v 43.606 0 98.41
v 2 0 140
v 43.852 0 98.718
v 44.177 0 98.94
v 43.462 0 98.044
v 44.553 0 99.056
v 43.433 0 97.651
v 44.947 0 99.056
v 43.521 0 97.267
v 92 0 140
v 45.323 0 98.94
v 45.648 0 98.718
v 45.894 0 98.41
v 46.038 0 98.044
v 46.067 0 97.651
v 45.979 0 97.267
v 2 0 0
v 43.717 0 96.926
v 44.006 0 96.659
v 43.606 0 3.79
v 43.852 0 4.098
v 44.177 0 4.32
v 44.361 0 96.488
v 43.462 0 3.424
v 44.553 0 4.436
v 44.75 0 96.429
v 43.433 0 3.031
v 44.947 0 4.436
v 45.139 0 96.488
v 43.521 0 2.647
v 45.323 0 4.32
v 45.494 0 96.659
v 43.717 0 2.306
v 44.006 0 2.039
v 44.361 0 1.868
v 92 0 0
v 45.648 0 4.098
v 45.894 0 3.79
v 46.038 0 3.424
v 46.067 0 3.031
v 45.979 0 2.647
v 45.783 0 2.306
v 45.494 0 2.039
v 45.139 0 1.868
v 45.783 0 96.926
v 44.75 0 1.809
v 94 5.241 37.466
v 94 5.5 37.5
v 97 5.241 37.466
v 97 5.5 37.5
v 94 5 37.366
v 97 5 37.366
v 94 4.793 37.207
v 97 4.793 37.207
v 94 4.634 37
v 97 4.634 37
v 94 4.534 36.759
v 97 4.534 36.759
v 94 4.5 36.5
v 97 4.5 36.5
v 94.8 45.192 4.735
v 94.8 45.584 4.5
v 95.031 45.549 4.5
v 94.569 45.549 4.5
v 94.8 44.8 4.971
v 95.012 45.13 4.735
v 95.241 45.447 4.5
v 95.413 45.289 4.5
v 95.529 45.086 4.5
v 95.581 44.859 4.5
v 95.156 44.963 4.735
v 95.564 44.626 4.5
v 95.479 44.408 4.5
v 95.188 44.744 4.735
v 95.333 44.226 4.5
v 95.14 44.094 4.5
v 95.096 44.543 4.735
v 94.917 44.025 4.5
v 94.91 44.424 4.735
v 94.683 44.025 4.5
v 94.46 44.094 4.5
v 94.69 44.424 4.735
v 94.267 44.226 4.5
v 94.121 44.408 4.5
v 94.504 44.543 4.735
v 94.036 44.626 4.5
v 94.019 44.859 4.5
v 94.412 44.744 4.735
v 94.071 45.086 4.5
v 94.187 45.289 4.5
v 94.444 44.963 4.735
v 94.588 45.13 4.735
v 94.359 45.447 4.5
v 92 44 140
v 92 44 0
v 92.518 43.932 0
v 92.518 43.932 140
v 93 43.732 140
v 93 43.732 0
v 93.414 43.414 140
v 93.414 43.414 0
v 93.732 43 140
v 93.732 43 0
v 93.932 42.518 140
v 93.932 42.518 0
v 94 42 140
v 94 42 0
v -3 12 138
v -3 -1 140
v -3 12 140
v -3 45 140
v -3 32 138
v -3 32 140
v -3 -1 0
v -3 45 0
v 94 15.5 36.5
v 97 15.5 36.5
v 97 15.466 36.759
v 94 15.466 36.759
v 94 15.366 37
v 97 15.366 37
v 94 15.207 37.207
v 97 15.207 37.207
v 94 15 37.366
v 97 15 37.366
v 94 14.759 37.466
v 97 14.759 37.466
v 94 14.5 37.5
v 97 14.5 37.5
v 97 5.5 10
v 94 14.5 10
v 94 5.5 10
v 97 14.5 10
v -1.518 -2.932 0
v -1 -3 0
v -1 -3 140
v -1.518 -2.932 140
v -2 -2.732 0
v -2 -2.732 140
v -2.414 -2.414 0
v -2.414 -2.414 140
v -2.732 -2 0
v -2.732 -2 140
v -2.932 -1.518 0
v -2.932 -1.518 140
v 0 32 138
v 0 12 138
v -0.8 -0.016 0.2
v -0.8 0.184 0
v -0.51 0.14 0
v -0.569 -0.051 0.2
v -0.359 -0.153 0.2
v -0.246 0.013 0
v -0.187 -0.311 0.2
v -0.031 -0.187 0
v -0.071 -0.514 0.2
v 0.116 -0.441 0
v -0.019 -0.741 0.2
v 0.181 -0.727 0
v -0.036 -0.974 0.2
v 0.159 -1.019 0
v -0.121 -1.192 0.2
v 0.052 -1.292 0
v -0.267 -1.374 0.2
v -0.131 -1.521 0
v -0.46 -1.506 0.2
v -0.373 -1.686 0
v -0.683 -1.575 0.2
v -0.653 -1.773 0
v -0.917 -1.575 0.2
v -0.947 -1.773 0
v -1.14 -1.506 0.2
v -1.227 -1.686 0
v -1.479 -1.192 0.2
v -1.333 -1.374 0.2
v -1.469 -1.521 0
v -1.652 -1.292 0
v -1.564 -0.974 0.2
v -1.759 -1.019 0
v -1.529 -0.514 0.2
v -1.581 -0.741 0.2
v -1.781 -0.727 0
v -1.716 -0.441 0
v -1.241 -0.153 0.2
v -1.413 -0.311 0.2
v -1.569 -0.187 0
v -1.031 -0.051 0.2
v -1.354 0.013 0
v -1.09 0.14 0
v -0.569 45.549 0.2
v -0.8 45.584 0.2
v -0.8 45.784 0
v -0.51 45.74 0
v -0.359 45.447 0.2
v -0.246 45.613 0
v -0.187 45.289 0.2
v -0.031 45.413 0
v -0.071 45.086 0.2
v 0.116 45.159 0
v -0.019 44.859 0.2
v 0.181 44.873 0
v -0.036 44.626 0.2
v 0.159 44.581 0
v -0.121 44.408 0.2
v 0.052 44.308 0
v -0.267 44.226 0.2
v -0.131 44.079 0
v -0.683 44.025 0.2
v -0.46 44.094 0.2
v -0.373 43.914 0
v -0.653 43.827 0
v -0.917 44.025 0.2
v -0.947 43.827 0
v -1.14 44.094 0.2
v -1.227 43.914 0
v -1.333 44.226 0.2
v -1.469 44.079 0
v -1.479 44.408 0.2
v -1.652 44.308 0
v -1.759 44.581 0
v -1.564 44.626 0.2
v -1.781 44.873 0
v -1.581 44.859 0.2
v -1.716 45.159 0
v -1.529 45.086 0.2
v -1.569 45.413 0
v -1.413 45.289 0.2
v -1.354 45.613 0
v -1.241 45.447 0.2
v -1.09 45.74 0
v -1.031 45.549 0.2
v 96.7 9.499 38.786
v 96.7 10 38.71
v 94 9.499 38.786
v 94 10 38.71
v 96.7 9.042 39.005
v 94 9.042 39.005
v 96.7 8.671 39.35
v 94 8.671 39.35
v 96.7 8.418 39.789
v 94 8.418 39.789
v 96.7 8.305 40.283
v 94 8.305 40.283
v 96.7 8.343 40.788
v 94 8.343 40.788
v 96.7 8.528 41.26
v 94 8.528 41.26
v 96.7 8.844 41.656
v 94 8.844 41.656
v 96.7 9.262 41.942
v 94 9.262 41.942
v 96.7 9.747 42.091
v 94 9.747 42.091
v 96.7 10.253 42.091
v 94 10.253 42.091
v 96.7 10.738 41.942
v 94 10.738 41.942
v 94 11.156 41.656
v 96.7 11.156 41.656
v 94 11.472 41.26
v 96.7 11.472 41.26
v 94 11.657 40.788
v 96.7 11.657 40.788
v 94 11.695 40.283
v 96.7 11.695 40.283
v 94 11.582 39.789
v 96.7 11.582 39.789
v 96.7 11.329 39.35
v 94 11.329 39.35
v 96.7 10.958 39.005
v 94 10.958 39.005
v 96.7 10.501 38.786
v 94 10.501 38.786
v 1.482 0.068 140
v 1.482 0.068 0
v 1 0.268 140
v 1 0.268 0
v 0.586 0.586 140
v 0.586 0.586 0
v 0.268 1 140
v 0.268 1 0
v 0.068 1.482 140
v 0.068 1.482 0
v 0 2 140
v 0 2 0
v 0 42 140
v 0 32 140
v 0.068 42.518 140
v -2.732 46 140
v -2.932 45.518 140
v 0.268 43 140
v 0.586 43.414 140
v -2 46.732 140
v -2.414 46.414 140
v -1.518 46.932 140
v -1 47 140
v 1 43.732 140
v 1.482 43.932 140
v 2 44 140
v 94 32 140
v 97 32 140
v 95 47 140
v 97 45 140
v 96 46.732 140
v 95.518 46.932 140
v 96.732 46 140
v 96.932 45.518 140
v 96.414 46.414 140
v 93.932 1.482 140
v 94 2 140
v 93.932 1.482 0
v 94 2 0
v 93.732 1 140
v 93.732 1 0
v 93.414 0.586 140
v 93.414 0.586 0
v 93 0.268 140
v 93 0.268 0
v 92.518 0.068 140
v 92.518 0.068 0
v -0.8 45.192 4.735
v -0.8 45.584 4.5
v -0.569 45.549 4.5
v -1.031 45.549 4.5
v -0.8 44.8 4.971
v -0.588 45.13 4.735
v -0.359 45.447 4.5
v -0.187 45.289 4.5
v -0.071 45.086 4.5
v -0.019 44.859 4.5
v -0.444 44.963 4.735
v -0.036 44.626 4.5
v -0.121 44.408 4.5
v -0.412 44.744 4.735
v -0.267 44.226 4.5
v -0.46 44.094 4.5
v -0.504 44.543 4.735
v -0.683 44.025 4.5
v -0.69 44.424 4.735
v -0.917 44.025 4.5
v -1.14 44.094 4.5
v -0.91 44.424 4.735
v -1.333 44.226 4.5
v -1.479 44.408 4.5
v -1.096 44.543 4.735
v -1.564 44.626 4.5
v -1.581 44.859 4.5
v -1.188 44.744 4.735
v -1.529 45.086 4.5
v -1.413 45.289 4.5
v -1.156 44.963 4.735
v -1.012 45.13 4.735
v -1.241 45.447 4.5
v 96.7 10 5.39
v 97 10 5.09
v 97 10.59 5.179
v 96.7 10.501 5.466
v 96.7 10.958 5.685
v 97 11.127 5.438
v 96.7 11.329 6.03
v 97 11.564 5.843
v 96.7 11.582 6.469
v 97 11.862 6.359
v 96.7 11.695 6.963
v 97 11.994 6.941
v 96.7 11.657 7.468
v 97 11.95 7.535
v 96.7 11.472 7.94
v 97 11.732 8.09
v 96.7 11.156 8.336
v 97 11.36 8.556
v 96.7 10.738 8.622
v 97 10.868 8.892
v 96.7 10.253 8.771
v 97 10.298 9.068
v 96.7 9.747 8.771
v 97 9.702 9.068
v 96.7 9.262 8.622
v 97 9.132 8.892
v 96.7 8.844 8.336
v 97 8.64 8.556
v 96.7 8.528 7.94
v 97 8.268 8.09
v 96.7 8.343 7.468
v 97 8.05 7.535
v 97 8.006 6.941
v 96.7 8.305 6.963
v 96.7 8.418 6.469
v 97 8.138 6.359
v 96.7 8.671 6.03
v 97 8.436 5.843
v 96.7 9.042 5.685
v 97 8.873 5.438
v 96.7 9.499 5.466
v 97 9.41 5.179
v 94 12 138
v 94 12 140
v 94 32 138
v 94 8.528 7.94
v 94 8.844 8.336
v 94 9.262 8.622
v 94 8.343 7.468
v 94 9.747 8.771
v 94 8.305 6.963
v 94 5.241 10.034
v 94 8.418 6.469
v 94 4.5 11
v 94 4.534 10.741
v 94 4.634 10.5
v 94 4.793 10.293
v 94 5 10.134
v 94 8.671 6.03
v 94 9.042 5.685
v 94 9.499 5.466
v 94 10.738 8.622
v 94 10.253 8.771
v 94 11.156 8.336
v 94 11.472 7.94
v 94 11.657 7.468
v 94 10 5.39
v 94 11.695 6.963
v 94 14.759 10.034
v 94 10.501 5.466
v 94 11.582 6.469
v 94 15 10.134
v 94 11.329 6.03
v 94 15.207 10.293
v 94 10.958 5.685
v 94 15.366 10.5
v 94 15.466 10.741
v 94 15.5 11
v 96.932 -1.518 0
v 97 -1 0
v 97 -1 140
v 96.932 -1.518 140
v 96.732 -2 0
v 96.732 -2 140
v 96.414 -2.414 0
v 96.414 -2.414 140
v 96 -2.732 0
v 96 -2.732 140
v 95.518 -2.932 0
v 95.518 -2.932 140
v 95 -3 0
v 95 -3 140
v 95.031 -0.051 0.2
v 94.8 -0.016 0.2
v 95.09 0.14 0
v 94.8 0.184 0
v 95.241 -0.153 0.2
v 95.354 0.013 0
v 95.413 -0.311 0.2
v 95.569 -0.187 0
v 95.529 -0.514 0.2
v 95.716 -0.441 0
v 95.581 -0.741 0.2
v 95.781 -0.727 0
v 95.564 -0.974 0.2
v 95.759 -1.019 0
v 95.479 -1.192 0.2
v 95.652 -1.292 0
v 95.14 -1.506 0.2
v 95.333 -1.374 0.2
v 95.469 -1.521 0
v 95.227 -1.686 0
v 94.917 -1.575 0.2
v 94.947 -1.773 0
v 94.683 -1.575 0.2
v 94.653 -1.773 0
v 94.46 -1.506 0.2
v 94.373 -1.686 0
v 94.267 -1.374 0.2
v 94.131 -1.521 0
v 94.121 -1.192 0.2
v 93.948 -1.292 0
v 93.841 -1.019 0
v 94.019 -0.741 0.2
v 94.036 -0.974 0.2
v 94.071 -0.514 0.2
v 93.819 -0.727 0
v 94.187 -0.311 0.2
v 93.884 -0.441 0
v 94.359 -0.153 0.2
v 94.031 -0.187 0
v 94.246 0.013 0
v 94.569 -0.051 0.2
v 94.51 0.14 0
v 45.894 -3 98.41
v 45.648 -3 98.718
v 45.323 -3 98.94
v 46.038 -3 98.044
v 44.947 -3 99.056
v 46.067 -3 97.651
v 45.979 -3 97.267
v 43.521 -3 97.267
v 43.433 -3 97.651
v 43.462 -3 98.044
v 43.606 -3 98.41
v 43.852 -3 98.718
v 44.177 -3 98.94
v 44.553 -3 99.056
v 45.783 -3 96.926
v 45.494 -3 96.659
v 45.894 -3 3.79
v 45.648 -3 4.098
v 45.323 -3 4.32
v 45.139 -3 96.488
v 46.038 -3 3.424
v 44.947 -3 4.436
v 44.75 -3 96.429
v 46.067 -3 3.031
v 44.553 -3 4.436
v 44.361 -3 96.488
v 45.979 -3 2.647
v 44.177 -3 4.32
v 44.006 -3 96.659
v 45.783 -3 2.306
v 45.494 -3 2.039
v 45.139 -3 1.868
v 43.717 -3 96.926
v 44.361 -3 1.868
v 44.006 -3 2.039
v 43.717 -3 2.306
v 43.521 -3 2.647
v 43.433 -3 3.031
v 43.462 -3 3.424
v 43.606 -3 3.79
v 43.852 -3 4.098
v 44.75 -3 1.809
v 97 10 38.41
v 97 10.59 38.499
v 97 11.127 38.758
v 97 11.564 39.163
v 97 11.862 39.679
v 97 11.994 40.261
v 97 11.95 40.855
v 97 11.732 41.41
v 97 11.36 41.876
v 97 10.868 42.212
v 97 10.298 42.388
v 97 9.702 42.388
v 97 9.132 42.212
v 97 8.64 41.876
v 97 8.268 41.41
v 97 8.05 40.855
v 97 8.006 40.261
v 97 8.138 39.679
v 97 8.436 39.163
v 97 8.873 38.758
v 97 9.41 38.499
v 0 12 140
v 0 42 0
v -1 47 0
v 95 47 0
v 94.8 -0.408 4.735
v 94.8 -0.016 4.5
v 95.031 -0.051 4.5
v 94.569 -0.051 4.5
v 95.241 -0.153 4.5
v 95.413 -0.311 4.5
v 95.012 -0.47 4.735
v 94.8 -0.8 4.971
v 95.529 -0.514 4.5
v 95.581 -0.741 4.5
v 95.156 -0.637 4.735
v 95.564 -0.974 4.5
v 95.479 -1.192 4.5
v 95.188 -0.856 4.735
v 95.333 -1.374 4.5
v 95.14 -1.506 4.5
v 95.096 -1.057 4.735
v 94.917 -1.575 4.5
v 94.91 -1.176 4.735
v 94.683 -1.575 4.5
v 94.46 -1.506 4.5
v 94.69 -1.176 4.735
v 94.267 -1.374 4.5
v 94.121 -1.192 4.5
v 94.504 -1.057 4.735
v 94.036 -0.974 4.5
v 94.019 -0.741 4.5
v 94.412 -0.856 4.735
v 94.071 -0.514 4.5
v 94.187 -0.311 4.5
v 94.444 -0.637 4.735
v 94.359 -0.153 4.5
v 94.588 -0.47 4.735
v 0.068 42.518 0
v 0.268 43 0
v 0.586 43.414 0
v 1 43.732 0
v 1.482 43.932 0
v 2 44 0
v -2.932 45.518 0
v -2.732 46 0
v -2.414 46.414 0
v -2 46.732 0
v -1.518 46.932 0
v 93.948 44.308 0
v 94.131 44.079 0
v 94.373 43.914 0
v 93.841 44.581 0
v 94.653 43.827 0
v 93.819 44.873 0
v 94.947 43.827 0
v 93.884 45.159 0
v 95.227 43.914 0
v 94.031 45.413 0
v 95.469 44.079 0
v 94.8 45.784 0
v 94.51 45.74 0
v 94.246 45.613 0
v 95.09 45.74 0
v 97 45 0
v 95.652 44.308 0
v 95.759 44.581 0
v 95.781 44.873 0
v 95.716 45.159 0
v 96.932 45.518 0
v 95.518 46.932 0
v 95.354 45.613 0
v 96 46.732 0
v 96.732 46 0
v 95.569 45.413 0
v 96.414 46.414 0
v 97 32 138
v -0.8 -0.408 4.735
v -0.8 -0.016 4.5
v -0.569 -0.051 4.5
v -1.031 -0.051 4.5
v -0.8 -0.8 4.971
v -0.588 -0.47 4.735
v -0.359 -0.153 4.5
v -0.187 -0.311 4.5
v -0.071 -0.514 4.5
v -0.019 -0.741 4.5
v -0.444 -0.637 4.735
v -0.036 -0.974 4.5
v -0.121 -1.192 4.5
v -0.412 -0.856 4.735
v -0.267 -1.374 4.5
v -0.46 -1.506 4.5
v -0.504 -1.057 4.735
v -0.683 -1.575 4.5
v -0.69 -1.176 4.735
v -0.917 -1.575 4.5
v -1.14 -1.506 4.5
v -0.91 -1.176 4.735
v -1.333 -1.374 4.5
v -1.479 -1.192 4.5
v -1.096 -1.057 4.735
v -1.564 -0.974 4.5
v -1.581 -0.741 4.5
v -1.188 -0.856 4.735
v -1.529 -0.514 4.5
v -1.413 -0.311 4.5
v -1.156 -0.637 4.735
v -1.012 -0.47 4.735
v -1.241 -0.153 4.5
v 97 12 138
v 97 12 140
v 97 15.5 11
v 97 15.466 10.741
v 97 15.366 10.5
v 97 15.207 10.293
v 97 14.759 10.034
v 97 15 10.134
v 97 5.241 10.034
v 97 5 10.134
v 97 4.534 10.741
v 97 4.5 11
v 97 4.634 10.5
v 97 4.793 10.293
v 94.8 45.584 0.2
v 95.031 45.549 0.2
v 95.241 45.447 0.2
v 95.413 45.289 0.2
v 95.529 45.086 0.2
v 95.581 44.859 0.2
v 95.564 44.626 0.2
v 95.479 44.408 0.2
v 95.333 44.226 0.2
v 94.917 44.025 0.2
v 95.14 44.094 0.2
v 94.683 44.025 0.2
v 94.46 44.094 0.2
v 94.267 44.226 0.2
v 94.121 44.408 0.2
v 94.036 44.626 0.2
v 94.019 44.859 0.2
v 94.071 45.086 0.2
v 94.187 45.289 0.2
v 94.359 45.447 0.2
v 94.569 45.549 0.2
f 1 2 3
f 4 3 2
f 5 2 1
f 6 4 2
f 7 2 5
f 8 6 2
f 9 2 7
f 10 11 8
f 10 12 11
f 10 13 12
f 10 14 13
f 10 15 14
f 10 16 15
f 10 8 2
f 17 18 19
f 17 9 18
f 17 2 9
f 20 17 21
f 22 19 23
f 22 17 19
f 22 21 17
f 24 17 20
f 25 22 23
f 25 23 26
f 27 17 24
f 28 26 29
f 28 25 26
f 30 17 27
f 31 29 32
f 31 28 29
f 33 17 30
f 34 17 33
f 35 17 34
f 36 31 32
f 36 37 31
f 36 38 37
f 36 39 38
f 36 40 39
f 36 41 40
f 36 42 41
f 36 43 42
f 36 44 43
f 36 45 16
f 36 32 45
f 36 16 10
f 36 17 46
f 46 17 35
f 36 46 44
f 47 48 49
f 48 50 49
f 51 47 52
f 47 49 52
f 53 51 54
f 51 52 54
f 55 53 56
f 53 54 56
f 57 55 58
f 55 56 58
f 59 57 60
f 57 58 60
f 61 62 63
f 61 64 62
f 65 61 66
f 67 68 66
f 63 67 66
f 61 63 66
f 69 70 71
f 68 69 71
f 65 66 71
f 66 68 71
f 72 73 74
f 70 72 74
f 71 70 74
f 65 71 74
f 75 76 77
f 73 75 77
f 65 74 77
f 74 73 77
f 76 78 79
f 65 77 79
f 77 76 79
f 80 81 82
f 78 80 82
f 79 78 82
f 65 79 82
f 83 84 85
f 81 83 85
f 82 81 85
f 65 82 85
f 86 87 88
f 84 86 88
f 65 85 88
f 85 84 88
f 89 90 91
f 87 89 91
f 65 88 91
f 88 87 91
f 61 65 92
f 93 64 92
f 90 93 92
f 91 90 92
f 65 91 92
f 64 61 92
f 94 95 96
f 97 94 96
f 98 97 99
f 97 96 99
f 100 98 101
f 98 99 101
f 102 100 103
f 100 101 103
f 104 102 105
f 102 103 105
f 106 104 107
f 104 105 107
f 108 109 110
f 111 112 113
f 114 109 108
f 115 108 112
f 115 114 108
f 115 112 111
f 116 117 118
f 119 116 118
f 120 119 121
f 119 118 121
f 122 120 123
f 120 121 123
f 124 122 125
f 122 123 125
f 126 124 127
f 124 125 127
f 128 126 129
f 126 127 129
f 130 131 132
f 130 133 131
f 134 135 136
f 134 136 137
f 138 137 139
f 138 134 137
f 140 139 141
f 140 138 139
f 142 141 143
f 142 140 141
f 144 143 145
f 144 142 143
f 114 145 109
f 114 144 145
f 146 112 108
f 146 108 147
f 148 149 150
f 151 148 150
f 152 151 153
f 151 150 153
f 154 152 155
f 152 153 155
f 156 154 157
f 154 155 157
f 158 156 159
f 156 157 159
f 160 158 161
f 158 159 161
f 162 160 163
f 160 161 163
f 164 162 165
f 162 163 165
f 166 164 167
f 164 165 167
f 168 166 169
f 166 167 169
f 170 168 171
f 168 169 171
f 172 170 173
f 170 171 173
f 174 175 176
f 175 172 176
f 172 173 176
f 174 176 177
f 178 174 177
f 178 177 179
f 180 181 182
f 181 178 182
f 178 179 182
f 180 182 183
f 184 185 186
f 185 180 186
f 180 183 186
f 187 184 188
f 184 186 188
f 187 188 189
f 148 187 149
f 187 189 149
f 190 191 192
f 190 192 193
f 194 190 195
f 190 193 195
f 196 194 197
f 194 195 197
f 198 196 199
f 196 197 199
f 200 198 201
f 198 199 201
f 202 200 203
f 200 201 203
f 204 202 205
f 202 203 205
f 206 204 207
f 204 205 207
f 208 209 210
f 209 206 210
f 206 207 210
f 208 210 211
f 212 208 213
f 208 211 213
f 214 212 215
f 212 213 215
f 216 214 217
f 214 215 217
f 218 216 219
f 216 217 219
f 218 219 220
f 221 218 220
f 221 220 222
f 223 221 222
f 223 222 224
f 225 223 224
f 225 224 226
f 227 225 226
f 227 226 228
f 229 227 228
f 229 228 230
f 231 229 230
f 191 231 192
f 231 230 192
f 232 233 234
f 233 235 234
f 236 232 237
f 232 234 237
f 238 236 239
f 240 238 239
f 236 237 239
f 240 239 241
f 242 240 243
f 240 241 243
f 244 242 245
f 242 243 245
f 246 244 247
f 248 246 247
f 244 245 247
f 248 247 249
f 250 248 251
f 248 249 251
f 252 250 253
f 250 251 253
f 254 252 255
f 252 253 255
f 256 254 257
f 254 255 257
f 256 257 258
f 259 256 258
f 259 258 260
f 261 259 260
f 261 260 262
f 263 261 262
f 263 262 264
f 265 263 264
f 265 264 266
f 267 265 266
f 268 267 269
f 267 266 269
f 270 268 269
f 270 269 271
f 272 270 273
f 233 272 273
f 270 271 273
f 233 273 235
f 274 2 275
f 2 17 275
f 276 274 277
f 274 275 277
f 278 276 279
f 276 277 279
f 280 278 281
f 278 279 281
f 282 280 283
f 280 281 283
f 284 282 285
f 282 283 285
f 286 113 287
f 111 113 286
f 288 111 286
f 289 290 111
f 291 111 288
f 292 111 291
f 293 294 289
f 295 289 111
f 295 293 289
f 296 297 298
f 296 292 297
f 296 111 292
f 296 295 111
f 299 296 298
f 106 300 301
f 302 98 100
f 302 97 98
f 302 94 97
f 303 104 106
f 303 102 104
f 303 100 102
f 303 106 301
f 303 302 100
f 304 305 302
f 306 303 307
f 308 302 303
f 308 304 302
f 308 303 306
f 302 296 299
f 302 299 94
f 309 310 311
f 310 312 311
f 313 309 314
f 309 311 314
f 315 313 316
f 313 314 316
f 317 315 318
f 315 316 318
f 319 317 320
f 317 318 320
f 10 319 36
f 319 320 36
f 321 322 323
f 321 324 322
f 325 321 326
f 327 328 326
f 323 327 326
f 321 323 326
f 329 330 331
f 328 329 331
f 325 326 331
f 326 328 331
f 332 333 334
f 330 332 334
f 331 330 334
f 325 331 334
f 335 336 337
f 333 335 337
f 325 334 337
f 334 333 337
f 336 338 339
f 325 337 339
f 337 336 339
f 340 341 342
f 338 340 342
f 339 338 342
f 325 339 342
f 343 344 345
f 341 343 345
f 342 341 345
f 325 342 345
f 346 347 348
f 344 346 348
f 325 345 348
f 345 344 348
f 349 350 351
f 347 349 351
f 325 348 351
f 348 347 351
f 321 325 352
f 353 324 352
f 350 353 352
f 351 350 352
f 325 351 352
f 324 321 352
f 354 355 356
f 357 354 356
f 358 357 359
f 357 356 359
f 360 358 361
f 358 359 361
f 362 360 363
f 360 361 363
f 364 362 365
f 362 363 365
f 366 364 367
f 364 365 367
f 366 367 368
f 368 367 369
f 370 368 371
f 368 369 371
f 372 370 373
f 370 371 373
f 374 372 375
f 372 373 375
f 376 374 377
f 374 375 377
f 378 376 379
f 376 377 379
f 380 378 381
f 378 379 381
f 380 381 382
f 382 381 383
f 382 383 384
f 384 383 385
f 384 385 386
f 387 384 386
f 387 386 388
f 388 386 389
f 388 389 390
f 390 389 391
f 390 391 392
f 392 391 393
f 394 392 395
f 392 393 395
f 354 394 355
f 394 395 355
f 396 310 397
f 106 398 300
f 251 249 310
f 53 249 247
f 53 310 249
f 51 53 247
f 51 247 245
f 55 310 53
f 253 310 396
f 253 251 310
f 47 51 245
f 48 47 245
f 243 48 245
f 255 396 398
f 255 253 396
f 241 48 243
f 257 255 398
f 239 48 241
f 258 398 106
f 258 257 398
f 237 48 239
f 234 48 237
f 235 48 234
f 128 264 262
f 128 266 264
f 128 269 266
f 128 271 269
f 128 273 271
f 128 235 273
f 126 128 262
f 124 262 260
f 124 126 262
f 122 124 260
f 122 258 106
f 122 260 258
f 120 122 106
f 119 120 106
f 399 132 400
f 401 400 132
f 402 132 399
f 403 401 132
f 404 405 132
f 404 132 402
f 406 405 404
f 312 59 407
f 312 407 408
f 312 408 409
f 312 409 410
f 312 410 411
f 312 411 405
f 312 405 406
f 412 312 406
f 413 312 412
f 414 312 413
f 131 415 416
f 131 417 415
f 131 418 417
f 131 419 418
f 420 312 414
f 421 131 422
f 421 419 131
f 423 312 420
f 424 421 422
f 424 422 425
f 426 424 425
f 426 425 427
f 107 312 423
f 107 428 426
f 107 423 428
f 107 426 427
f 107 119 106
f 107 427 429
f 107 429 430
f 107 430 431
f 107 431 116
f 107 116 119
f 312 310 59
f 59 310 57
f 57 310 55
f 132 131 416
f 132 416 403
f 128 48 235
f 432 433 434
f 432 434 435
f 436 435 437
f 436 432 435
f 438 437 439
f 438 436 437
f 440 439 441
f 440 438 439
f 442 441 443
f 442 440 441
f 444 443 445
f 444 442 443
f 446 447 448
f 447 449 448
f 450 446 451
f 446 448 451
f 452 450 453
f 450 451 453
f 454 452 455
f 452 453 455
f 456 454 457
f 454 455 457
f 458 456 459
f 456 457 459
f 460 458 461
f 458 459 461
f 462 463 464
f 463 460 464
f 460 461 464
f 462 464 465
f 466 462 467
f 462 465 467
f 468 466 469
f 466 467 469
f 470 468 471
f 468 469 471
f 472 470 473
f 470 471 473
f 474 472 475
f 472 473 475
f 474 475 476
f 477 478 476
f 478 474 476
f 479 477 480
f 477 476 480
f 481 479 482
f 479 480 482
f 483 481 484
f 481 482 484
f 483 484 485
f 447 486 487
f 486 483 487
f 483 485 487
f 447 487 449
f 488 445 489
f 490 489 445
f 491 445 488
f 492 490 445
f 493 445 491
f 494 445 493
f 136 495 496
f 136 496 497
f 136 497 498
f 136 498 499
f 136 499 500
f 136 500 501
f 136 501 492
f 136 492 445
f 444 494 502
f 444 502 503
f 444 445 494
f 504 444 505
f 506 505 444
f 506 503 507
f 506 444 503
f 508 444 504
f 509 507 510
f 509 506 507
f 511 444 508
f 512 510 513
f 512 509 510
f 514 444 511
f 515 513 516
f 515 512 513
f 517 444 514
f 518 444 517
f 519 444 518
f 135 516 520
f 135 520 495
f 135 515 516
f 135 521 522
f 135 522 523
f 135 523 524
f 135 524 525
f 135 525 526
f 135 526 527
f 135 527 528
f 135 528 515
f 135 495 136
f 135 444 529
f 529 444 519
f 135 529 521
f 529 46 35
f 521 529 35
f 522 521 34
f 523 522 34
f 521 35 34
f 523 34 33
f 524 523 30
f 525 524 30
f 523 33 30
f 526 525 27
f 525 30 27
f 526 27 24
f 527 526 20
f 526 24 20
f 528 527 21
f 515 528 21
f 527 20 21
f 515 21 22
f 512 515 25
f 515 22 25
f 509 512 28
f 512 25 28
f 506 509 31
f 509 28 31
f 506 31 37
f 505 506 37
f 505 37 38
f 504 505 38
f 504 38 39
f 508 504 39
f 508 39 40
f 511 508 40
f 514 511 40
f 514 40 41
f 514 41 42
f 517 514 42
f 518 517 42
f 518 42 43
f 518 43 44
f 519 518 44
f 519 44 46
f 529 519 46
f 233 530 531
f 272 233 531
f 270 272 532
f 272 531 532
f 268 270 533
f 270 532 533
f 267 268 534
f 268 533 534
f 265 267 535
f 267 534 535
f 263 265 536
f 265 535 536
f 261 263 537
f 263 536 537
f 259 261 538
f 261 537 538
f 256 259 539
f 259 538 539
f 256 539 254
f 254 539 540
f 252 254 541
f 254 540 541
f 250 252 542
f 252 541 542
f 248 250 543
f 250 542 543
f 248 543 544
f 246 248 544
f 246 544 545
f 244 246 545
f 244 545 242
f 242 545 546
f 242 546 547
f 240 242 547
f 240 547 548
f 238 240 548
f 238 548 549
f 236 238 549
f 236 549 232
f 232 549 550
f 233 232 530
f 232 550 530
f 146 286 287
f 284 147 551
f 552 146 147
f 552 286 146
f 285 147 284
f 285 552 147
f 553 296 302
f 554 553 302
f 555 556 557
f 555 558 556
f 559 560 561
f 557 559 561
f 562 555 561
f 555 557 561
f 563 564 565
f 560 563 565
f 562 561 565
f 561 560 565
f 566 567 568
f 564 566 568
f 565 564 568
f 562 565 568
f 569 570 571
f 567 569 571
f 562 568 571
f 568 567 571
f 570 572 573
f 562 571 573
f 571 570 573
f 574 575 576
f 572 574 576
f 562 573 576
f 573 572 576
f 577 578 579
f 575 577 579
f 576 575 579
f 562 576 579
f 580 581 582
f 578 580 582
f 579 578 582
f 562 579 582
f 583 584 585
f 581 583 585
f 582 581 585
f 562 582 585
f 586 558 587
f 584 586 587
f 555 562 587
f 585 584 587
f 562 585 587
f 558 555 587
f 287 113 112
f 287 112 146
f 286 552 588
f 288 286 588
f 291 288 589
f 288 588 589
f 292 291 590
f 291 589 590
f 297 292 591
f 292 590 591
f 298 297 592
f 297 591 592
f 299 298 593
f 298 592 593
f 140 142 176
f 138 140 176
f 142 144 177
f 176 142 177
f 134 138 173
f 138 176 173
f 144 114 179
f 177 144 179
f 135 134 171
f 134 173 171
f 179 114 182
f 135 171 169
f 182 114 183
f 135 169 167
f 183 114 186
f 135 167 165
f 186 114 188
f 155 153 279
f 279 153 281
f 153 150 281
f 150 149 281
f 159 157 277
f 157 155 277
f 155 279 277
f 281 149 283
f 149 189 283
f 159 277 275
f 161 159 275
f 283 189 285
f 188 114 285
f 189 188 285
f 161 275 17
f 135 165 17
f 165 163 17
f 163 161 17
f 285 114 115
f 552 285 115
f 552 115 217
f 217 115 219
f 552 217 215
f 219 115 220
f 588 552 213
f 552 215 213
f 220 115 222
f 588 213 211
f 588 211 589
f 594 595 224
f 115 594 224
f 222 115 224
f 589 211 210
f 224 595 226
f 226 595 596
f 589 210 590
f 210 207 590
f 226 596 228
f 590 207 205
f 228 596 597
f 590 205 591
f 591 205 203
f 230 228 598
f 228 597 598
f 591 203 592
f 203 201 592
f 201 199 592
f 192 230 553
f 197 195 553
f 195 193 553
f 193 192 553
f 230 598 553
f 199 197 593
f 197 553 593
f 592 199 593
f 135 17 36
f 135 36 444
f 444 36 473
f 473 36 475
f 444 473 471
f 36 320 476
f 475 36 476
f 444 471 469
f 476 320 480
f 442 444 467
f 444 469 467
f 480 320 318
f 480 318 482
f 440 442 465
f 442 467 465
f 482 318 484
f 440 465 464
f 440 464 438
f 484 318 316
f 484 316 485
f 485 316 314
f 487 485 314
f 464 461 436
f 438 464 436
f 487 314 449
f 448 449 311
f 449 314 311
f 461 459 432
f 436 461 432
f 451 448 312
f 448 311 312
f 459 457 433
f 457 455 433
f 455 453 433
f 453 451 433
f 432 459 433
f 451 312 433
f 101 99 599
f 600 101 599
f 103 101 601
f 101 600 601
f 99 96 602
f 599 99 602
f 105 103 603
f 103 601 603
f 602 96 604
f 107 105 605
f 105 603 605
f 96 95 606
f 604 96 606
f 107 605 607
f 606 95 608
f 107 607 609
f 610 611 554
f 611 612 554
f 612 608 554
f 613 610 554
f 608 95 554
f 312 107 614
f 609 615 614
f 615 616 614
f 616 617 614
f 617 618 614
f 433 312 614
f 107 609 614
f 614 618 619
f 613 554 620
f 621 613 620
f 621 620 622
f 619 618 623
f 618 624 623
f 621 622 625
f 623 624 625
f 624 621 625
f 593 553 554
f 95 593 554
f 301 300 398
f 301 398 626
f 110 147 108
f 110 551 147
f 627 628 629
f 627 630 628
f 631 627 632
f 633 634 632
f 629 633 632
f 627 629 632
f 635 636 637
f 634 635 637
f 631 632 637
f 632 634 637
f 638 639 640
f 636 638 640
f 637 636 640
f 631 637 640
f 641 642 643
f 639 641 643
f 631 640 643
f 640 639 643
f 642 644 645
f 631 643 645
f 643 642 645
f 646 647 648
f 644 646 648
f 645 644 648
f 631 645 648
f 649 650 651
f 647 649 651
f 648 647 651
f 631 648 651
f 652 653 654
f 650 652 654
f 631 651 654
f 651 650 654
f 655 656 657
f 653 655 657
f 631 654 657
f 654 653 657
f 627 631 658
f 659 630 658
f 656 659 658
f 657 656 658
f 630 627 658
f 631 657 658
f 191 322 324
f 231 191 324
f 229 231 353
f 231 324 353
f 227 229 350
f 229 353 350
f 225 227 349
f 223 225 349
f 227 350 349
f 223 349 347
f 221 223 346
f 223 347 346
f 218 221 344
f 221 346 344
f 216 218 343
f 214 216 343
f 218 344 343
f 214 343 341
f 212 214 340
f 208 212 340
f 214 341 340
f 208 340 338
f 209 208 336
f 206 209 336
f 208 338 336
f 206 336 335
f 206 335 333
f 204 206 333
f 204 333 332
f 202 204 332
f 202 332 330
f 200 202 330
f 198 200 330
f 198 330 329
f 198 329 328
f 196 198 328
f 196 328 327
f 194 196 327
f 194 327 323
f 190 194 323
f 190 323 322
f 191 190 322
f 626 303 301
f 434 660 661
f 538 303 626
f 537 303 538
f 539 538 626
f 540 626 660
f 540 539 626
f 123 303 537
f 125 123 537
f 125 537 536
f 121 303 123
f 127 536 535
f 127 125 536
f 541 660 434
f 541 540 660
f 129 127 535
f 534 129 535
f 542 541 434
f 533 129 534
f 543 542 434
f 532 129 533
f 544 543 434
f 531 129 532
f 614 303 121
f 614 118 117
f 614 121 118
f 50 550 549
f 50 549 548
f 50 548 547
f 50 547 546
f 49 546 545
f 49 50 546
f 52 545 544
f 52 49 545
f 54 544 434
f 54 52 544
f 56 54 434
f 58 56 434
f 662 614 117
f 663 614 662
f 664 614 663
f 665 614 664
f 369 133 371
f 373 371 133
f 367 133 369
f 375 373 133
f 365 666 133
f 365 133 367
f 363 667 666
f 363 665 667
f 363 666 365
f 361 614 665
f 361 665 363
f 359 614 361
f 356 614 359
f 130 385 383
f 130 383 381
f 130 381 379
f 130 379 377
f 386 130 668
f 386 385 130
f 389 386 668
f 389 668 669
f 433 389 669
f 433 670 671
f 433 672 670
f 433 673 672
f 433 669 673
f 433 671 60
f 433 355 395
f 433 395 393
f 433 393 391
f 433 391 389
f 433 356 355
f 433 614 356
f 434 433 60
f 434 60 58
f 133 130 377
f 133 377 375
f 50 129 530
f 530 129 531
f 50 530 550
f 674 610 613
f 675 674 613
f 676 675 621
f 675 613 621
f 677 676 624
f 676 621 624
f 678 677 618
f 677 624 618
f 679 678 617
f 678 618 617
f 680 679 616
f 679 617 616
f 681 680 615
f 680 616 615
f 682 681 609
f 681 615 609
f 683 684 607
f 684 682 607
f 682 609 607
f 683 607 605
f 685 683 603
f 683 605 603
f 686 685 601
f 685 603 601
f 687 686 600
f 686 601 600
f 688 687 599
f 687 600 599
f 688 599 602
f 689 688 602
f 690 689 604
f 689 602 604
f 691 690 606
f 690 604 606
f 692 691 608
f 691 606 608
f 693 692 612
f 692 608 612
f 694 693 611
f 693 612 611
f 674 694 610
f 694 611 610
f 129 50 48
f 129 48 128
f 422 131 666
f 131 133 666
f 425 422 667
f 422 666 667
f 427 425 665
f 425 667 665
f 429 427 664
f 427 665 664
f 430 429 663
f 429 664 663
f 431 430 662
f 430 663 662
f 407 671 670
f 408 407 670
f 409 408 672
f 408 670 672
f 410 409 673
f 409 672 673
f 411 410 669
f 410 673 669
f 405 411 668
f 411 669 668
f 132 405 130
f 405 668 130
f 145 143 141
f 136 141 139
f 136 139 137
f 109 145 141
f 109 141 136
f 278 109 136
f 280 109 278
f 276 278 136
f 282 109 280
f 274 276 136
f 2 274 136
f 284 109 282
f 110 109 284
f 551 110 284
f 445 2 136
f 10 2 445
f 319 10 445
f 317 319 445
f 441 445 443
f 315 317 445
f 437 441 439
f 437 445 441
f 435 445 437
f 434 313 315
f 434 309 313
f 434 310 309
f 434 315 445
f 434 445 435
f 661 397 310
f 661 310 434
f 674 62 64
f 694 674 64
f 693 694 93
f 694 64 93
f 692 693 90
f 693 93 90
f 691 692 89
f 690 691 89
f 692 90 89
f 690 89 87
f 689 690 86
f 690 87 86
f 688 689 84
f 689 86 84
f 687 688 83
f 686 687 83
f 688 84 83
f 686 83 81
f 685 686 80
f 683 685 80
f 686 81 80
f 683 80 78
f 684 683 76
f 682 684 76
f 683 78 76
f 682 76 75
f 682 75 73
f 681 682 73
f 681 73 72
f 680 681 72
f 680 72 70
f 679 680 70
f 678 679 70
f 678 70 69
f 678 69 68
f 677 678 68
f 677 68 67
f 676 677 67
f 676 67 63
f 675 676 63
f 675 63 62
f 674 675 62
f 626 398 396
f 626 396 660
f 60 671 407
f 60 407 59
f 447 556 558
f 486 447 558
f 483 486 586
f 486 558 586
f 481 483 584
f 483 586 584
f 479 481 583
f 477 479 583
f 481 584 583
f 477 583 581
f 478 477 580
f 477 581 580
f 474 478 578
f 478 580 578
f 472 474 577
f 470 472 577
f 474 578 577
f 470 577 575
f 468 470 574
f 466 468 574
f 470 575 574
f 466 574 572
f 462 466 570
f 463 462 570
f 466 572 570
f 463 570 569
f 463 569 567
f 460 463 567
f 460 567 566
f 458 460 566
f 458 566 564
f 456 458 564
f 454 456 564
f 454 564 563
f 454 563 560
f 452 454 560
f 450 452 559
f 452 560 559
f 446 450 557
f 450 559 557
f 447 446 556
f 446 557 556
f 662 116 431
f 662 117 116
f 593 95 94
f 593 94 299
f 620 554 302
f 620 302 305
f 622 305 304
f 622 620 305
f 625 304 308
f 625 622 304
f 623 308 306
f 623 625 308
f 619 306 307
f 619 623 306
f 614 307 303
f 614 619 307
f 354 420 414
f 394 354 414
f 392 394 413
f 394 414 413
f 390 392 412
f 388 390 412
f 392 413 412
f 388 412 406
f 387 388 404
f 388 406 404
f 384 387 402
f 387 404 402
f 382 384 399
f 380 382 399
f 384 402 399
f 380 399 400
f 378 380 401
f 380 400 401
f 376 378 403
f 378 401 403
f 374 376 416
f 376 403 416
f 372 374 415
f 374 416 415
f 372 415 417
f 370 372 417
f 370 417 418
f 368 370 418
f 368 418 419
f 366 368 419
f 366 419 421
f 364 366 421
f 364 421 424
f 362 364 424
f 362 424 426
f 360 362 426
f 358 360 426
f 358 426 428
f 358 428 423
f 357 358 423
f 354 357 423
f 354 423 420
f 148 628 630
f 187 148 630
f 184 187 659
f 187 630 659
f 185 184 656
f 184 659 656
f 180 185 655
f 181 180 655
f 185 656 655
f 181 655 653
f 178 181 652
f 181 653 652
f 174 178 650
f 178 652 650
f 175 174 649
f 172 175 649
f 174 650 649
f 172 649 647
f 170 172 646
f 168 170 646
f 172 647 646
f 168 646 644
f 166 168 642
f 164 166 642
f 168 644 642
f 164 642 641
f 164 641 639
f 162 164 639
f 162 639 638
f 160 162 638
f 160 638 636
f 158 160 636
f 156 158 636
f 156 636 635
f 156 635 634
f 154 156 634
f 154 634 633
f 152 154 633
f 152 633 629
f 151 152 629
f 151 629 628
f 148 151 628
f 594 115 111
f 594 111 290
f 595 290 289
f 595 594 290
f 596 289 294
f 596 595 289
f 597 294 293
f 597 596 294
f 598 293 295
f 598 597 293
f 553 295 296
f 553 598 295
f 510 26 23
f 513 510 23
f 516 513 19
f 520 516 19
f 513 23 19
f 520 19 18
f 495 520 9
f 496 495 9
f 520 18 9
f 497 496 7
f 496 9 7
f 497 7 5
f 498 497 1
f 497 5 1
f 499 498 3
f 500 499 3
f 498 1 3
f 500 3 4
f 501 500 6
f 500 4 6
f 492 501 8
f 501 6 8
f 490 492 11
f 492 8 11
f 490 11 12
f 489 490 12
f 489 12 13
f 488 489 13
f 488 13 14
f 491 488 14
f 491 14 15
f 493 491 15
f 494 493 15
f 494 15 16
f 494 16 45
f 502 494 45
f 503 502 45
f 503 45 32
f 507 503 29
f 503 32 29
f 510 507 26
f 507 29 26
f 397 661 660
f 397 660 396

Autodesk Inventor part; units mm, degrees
ref_plane "YZ Plane" through (0, 0, 0) normal (1, 0, 0) x (0, 1, 0)
ref_plane "XZ Plane" through (0, 0, 0) normal (0, 1, 0) x (-1, 0, 0)
ref_plane "XY Plane" through (0, 0, 0) normal (0, 0, 1) x (1, 0, 0)
sketch "Sketch1" plane through (0, 0, 0) normal (0, 0, 1) x (1, 0, 0)
  line L0 (2, 0) -> (92, 0)
  line L1 (94, 2) -> (94, 42)
  line L2 (92, 44) -> (2, 44)
  line L3 (0, 42) -> (0, 2)
  line L4 (-1, 47) -> (95, 47)
  line L5 (97, 45) -> (97, -1)
  line L6 (95, -3) -> (-1, -3)
  line L7 (-3, -1) -> (-3, 45)
  arc A0 (2, 44) -> (0, 42) centre (2, 42) ccw
  arc A1 (0, 2) -> (2, 0) centre (2, 2) ccw
  arc A2 (92, 0) -> (94, 2) centre (92, 2) ccw
  arc A3 (94, 42) -> (92, 44) centre (92, 42) ccw
  arc A4 (-3, -1) -> (-1, -3) centre (-1, -1) ccw
  arc A5 (-1, 47) -> (-3, 45) centre (-1, 45) ccw
  arc A6 (97, 45) -> (95, 47) centre (95, 45) ccw
  arc A7 (95, -3) -> (97, -1) centre (95, -1) ccw
  point P0 (0, 0)
  point P1 (94, 44)
  point P2 (94, 0)
  point P3 (0, 44)
  point P4 (97, -3)
  point P5 (97, 47)
  point P6 (-3, -3)
  dimension "d0" = 94
  dimension "d1" = 44
  dimension "d2" = 100
  dimension "d3" = 50
  dimension "d4" = 3
  dimension "d5" = 3
  dimension "d6" = 2
  dimension "d9" = 2
extrude "Extrusion1" add sketch "Sketch1" along normal blind 140
sketch "Sketch2" plane through (0, 0, 140) normal (0, 0, 1) x (1, 0, 0)
  line L0 (-3, 45) -> (-3, -1) projected
  line L1 (97, -1) -> (97, 45) projected
  line L2 (-3, 32) -> (97, 32)
  line L3 (97, 32) -> (97, 12)
  line L4 (97, 12) -> (-3, 12)
  line L5 (-3, 12) -> (-3, 32)
  line L6 (-1, -3) -> (95, -3) projected
  line L7 (95, 47) -> (-1, 47) projected
  point P0 (0, 0)
  point P1 (-3, 12)
  dimension "d10" = 20
  dimension "d11" = 15
  dimension "d12" = 50
extrude "Extrusion2" cut sketch "Sketch2" against normal blind 2
sketch "Sketch3" plane through (97, -1, 0) normal (1, 0, 0) x (0, 0, -1)
  line L0 (-11, 5.5) -> (-36.5, 5.5)
  line L1 (-37.5, 6.5) -> (-37.5, 15.5)
  line L2 (-36.5, 16.5) -> (-11, 16.5)
  line L3 (-10, 15.5) -> (-10, 6.5)
  line L4 (0, -2) -> (-140, -2) projected
  line L5 (0, 48) -> (-140, 48) projected
  line L6 (0, 0) -> (0, 46) projected
  arc A0 (-11, 5.5) -> (-10, 6.5) centre (-11, 6.5) ccw
  arc A1 (-10, 15.5) -> (-11, 16.5) centre (-11, 15.5) ccw
  arc A2 (-37.5, 6.5) -> (-36.5, 5.5) centre (-36.5, 6.5) ccw
  arc A3 (-36.5, 16.5) -> (-37.5, 15.5) centre (-36.5, 15.5) ccw
  circle A4 centre (-7.09, 11) radius 1.5
  circle A5 centre (-40.41, 11) radius 1.5
  line L7 (-23.75, 5.5) -> (-23.75, 19.7829) construction
  point P0 (0, 1)
  point P1 (-37.5, 16.5)
  point P2 (-37.5, 5.5)
  point P3 (-10, 16.5)
  dimension "d15" = 27.5
  dimension "d16" = 11
  dimension "d17" = 50
  dimension "d18" = 31.5
  dimension "d19" = 10
  dimension "d20" = 1
  dimension "d21" = 3
  dimension "d22" = 3
  dimension "d23" = 16.66
  dimension "d24" = 16.66
extrude "Extrusion3" cut sketch "Sketch3" against normal blind 10 contours L0 A2 L1 A3 L2 A1 L3 A0
hole "Hole1" at (97, 10, 7.09) at (97, 10, 40.41) direction (-1, 0, 0) diameter 3.4 depth 8.8 tip angle 118 clearance for "Countersunk Flat Head Screw ISO 2009/7046" size "M3" standard "ISO"
chamfer "Chamfer1" distance 0.3 angle 45 2 edges at (97, 10, 8.79) (97, 10, 42.11)
sketch "Sketch5" plane through (-1, -3, 0) normal (0, -1, 0) x (1, 0, 0)
  circle A0 centre (45.75, 3.13) radius 1.5
  circle A1 centre (45.75, 97.75) radius 1.5
  line L0 (98, 0) -> (98, 140) projected
  line L1 (0, 0) -> (96, 0) projected
  point P0 (1, 0)
  dimension "d49" = 3
  dimension "d50" = 3
  dimension "d51" = 94.62
  dimension "d52" = 52.25
  dimension "d53" = 3.13
hole "Hole3" at (44.75, -3, 3.13) at (44.75, -3, 97.75) direction (0, 1, 0) diameter 2.6416 depth 10.979 tip angle 118 thread size "6-32 UNC" class "2B" standard "ANSI Unified Screw Threads"
sketch "Sketch6" plane through (0, 0, 0) normal (0, 0, -1) x (-1, 0, 0)
  circle A0 centre (0.8, -0.8) radius 1
  line L0 (1, -3) -> (-95, -3) construction
  line L1 (-47, -3) -> (-47, -11.0585) construction
  line L2 (3, 45) -> (3, -1) construction
  line L3 (3, 22) -> (17.9543, 22) construction
  circle A1 centre (0.8, 44.8) radius 1
  line L4 (-47, 47) -> (-47, 55.0585) construction
  circle A2 centre (-94.8, -0.8) radius 1
  circle A3 centre (-94.8, 44.8) radius 1
  point P0 (0, 0)
  point P1 (-94, 0)
  point P2 (-97, 45)
  point P3 (-97, -1)
  dimension "d61" = 2
  dimension "d62" = 2.2
  dimension "d63" = 2.2
hole "Hole4" at (-0.8, -0.8, 0) at (-0.8, 44.8, 0) at (94.8, 44.8, 0) at (94.8, -0.8, 0) direction (0, 0, 1) diameter 1.567 depth 4.5 tip angle 118 thread size "M2x0.4" class "6H" standard "ISO Metric profile"
chamfer "Chamfer2" distance 0.2 angle 45 4 edges at (-0.8, -1.5835, 0) (-0.8, 44.0165, 0) (94.8, 44.0165, 0) (94.8, -1.5835, 0)
equation "\"d24\" = d23"
properties part number "obudowa"
